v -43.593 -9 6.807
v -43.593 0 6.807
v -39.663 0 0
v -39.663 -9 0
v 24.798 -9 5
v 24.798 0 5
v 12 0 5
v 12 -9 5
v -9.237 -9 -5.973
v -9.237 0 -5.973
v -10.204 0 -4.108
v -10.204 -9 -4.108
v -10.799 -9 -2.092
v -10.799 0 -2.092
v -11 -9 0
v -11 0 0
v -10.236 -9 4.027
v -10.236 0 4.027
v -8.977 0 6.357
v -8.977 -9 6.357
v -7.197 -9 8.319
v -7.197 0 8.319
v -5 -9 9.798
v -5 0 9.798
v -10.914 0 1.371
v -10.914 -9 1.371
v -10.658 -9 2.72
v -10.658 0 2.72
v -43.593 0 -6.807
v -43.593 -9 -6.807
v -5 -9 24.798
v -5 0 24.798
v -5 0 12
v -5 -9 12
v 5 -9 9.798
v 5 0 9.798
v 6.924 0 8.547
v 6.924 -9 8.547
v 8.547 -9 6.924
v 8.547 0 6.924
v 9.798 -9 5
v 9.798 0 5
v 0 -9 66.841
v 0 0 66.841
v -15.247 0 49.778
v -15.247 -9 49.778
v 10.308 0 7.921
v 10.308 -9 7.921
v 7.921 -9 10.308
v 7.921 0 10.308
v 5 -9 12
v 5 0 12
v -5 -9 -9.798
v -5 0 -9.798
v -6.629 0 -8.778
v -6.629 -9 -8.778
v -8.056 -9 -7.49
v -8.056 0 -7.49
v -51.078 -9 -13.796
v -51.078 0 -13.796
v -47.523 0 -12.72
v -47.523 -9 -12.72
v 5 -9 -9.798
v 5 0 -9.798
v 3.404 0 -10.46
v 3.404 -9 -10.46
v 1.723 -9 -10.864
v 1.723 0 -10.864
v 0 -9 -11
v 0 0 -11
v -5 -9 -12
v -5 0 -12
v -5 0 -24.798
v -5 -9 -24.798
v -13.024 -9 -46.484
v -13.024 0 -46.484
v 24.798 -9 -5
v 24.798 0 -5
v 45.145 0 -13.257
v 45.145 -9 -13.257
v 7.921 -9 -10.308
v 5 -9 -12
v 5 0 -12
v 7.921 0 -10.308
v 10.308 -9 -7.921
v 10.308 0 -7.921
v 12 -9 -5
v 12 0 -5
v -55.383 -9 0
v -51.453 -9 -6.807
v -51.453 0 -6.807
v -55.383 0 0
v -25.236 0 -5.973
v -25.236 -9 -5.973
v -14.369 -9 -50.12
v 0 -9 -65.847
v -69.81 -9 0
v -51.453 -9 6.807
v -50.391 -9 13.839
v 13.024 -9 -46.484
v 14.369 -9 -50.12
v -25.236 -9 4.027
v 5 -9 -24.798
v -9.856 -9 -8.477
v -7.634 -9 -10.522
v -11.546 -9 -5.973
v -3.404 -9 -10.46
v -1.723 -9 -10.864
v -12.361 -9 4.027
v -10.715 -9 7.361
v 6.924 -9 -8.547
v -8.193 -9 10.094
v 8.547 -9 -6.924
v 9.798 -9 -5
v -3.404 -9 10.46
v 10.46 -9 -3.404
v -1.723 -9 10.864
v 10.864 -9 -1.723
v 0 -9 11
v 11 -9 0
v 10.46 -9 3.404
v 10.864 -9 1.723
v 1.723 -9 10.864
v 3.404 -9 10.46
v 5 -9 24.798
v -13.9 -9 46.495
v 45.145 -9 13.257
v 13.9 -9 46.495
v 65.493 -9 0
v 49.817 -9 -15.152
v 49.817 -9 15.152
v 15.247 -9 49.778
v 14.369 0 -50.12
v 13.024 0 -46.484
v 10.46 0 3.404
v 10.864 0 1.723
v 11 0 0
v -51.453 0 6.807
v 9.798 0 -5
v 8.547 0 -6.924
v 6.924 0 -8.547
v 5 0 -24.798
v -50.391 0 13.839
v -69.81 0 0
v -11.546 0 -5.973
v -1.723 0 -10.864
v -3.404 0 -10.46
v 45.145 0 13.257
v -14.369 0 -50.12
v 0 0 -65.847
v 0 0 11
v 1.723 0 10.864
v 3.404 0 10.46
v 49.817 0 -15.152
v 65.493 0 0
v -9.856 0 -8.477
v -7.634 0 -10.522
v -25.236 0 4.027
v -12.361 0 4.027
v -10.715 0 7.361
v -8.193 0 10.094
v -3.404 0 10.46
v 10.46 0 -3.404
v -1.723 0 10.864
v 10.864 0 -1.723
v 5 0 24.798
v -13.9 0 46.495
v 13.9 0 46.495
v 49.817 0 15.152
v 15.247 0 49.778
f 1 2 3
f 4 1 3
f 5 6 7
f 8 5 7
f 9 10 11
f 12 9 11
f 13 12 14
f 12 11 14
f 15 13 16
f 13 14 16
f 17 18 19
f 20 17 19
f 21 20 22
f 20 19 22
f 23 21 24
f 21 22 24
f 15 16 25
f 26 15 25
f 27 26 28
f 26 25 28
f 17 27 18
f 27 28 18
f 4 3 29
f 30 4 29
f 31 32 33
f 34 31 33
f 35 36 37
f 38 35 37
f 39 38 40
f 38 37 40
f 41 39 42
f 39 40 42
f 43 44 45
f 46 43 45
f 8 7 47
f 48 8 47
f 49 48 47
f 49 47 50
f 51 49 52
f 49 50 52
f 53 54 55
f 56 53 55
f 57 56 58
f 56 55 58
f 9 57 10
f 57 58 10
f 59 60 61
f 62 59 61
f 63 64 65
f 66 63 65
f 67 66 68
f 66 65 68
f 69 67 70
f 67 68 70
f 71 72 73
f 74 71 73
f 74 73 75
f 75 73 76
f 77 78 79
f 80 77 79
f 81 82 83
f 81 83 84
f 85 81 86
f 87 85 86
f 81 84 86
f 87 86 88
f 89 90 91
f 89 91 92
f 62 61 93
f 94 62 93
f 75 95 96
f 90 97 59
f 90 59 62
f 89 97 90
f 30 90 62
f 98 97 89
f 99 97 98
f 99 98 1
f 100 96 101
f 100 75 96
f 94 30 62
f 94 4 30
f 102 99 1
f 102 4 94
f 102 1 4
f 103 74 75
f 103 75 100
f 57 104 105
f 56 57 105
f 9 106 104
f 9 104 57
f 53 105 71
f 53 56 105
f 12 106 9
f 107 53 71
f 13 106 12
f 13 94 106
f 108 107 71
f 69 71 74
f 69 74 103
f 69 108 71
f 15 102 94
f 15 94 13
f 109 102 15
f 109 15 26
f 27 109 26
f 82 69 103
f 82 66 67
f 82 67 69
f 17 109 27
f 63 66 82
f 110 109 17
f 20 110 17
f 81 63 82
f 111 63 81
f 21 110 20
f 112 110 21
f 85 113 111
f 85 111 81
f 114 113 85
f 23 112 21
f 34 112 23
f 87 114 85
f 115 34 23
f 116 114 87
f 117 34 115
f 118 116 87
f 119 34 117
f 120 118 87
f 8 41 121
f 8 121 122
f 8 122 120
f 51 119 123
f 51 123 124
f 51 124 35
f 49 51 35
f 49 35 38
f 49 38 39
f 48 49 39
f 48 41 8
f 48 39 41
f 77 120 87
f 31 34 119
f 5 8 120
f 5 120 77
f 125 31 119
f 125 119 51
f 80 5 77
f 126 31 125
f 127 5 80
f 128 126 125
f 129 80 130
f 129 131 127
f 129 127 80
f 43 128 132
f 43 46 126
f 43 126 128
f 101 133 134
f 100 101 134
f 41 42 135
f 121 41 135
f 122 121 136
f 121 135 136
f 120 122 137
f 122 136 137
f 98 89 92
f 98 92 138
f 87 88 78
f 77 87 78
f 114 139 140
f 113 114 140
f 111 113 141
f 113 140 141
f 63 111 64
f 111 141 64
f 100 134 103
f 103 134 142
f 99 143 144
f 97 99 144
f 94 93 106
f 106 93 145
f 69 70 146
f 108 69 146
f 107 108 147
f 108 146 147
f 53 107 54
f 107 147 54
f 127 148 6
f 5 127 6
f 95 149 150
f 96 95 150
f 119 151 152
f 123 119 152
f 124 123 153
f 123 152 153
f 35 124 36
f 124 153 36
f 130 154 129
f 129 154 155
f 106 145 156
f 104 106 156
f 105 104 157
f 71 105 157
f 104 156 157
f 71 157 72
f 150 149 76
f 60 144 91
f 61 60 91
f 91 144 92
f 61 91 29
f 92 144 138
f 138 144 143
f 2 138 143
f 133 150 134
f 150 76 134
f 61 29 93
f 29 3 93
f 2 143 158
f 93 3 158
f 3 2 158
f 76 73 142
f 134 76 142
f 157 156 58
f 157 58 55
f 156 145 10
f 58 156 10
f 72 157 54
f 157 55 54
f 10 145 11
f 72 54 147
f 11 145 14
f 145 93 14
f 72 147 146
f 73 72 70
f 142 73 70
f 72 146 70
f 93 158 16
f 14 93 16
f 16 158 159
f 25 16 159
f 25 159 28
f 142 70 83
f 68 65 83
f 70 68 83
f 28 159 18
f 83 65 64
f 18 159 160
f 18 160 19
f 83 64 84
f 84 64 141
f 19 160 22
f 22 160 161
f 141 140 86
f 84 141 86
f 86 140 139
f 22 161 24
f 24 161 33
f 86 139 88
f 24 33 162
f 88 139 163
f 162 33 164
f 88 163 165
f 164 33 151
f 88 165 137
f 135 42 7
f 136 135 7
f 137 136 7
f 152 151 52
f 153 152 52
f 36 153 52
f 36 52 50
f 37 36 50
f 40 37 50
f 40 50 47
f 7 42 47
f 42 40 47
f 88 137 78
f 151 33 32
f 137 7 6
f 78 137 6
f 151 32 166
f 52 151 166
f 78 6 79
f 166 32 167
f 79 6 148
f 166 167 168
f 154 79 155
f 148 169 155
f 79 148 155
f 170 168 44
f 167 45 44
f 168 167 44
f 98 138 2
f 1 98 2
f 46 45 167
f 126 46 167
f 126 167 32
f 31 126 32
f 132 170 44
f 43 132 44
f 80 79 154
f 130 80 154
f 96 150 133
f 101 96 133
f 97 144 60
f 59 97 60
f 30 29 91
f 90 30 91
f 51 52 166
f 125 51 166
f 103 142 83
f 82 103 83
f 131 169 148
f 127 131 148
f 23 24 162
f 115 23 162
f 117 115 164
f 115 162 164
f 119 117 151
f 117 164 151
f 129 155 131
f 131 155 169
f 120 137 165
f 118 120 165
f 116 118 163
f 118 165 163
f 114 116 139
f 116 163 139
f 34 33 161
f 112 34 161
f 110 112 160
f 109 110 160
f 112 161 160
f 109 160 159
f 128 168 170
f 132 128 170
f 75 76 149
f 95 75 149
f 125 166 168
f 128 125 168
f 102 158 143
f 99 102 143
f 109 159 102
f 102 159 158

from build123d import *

# Parameters (mm, degrees)
F1_DEPTH = 9


with BuildPart() as f1:
    # F0 (on Front) → F1 (new body)
    with BuildSketch(Plane.XZ):
        with BuildLine():
            Line((13, 0), (11, 0))
            ThreePointArc((11, 0), (10.695268783, -2.5712303784), (9.7979589711, -5))
            Line((9.7979589711, -5), (12, -5))
            ThreePointArc((12, -5), (12.747548784, -2.5495097568), (13, 0))
        make_face()
        with BuildLine():
            ThreePointArc((9.7979589711, 5), (10.695268783, 2.5712303784), (11, 0))
            Line((11, 0), (13, 0))
            ThreePointArc((13, 0), (12.747548784, 2.5495097568), (12, 5))
            Line((12, 5), (9.7979589711, 5))
        make_face()
        with BuildLine():
            ThreePointArc((5, 9.7979589711), (7.7781745931, 7.7781745931), (9.7979589711, 5))
            Line((9.7979589711, 5), (12, 5))
            ThreePointArc((12, 5), (9.1923881554, 9.1923881554), (5, 12))
            Line((5, 12), (5, 9.7979589711))
        make_face()
        with BuildLine():
            Line((12, -5), (9.7979589711, -5))
            ThreePointArc((9.7979589711, -5), (7.7781745931, -7.7781745931), (5, -9.7979589711))
            Line((5, -9.7979589711), (5, -12))
            ThreePointArc((5, -12), (9.1923881554, -9.1923881554), (12, -5))
        make_face()
        with BuildLine():
            Line((24.7979589711, 0), (13, 0))
            ThreePointArc((13, 0), (12.747548784, -2.5495097568), (12, -5))
            Line((12, -5), (24.7979589711, -5))
            Line((24.7979589711, -5), (24.7979589711, 0))
        make_face()
        with BuildLine():
            ThreePointArc((12, 5), (12.747548784, 2.5495097568), (13, 0))
            Line((13, 0), (24.7979589711, 0))
            Line((24.7979589711, 0), (24.7979589711, 5))
            Line((24.7979589711, 5), (12, 5))
        make_face()
        with BuildLine():
            ThreePointArc((0, 11), (2.5712303784, 10.695268783), (5, 9.7979589711))
            Line((5, 9.7979589711), (5, 12))
            ThreePointArc((5, 12), (2.5495097568, 12.747548784), (0, 13))
            Line((0, 13), (0, 11))
        make_face()
        with BuildLine():
            Line((5, -12), (5, -9.7979589711))
            ThreePointArc((5, -9.7979589711), (2.5712303784, -10.695268783), (0, -11))
            Line((0, -11), (0, -13))
            ThreePointArc((0, -13), (2.5495097568, -12.747548784), (5, -12))
        make_face()
        with BuildLine():
            Line((0, -13), (0, -11))
            ThreePointArc((0, -11), (-2.5712303784, -10.695268783), (-5, -9.7979589711))
            Line((-5, -9.7979589711), (-5, -12))
            ThreePointArc((-5, -12), (-2.5495097568, -12.747548784), (0, -13))
        make_face()
        with BuildLine():
            Line((-13, 0), (-11, 0))
            ThreePointArc((-11, 0), (-10.807426658, 2.0492752456), (-10.2364492669, 4.0267985307))
            Line((-10.2364492669, 4.0267985307), (-12.3606186574, 4.0267985307))
            ThreePointArc((-12.3606186574, 4.0267985307), (-12.8391596794, 2.0386217715), (-13, 0))
        make_face()
        with BuildLine():
            ThreePointArc((-9.2369293711, -5.9732014693), (-10.550028983, -3.1139827326), (-11, 0))
            Line((-11, 0), (-13, 0))
            ThreePointArc((-13, 0), (-12.6313904767, -3.073755785), (-11.5464654422, -5.9732014693))
            Line((-11.5464654422, -5.9732014693), (-9.2369293711, -5.9732014693))
        make_face()
        with BuildLine():
            ThreePointArc((-5, 9.7979589711), (-2.5712303784, 10.695268783), (0, 11))
            Line((0, 11), (0, 13))
            ThreePointArc((0, 13), (-2.5495097568, 12.747548784), (-5, 12))
            Line((-5, 12), (-5, 9.7979589711))
        make_face()
        Polygon((45.145274992, 0), (24.7979589711, 0), (24.7979589711, -5), (45.145274992, -13.2566292219), align=None)
        Polygon((24.7979589711, 5), (24.7979589711, 0), (45.145274992, 0), (45.145274992, 13.2566292219), align=None)
        with BuildLine():
            ThreePointArc((0, 13), (2.5495097568, 12.747548784), (5, 12))
            Line((5, 12), (5, 24.7979589711))
            Line((5, 24.7979589711), (0, 24.7979589711))
            Line((0, 24.7979589711), (0, 13))
        make_face()
        with BuildLine():
            Line((5, -24.7979589711), (5, -12))
            ThreePointArc((5, -12), (2.5495097568, -12.747548784), (0, -13))
            Line((0, -13), (0, -24.7979589711))
            Line((0, -24.7979589711), (5, -24.7979589711))
        make_face()
        with BuildLine():
            Line((-5, -12), (-5, -9.7979589711))
            ThreePointArc((-5, -9.7979589711), (-7.3708705026, -8.1651863441), (-9.2369293711, -5.9732014693))
            Line((-9.2369293711, -5.9732014693), (-11.5464654422, -5.9732014693))
            ThreePointArc((-11.5464654422, -5.9732014693), (-8.8049392269, -9.5641541816), (-5, -12))
        make_face()
        with BuildLine():
            Line((0, -24.7979589711), (0, -13))
            ThreePointArc((0, -13), (-2.5495097568, -12.747548784), (-5, -12))
            Line((-5, -12), (-5, -24.7979589711))
            Line((-5, -24.7979589711), (0, -24.7979589711))
        make_face()
        with BuildLine():
            Line((-12.3606186574, 4.0267985307), (-10.2364492669, 4.0267985307))
            ThreePointArc((-10.2364492669, 4.0267985307), (-8.1464053283, 7.3916223001), (-5, 9.7979589711))
            Line((-5, 9.7979589711), (-5, 12))
            ThreePointArc((-5, 12), (-9.5520026936, 8.8181202385), (-12.3606186574, 4.0267985307))
        make_face()
        with BuildLine():
            Line((-25.2364492669, 0), (-13, 0))
            ThreePointArc((-13, 0), (-12.8391596794, 2.0386217715), (-12.3606186574, 4.0267985307))
            Line((-12.3606186574, 4.0267985307), (-25.2364492669, 4.0267985307))
            Line((-25.2364492669, 4.0267985307), (-25.2364492669, 0))
        make_face()
        with BuildLine():
            ThreePointArc((-11.5464654422, -5.9732014693), (-12.6313904767, -3.073755785), (-13, 0))
            Line((-13, 0), (-25.2364492669, 0))
            Line((-25.2364492669, 0), (-25.2364492669, -0.9732014693))
            Line((-25.2364492669, -0.9732014693), (-25.2364492669, -5.9732014693))
            Line((-25.2364492669, -5.9732014693), (-11.5464654422, -5.9732014693))
        make_face()
        with BuildLine():
            ThreePointArc((-5, 12), (-2.5495097568, 12.747548784), (0, 13))
            Line((0, 13), (0, 24.7979589711))
            Line((0, 24.7979589711), (-5, 24.7979589711))
            Line((-5, 24.7979589711), (-5, 12))
        make_face()
        Polygon((45.145274992, 13.2566292219), (45.145274992, 0), (65.492591013, 0), (49.8166139769, 15.1521870403), align=None)
        Polygon((65.492591013, 0), (45.145274992, 0), (45.145274992, -13.2566292219), (49.8166139769, -15.1521870403), align=None)
        Polygon((0, 24.7979589711), (5, 24.7979589711), (13.9004829156, 46.4947918511), (0, 46.4947918511), align=None)
        Polygon((13.0237015361, -46.4836081518), (5, -24.7979589711), (0, -24.7979589711), (0, -46.4836081518), align=None)
        Polygon((0, -46.4836081518), (0, -24.7979589711), (-5, -24.7979589711), (-13.0237015361, -46.4836081518), (-1.1742307931, -46.4836081518), align=None)
        Polygon((-39.6632513358, 0), (-25.2364492669, 0), (-25.2364492669, 4.0267985307), (-47.5232979005, 12.7201679595), (-47.5232979005, 6.807), (-43.5932746181, 6.807), align=None)
        Polygon((-25.2364492669, -0.9732014693), (-25.2364492669, 0), (-39.6632513358, 0), (-43.5932746181, -6.807), (-47.5232979005, -6.807), (-47.5232979005, -12.7201679595), (-25.2364492669, -5.9732014693), align=None)
        Polygon((-5, 24.7979589711), (0, 24.7979589711), (0, 46.4947918511), (-13.9004829156, 46.4947918511), align=None)
        Polygon((0, 46.4947918511), (13.9004829156, 46.4947918511), (15.2472511326, 49.7778277503), (0, 66.8410263726), align=None)
        Polygon((14.3692514548, -50.1202244144), (13.0237015361, -46.4836081518), (0, -46.4836081518), (0, -65.8470422888), align=None)
        Polygon((0, -65.8470422888), (0, -46.4836081518), (-1.1742307931, -46.4836081518), (-13.0237015361, -46.4836081518), (-14.3692514548, -50.1202244144), align=None)
        Polygon((-13.9004829156, 46.4947918511), (0, 46.4947918511), (0, 66.8410263726), (-15.2472511326, 49.7778277503), align=None)
        Polygon((-47.5232979005, 6.807), (-47.5232979005, 12.7201679595), (-50.3905497057, 13.8385889439), (-69.8101465342, 0), (-55.3833444653, 0), (-51.4533211829, 6.807), align=None)
        Polygon((-51.0782389318, -13.7963662326), (-47.5232979005, -12.7201679595), (-47.5232979005, -6.807), (-51.4533211829, -6.807), (-55.3833444653, 0), (-69.8101465342, 0), align=None)
    extrude(amount=F1_DEPTH)


solid = f1.part
